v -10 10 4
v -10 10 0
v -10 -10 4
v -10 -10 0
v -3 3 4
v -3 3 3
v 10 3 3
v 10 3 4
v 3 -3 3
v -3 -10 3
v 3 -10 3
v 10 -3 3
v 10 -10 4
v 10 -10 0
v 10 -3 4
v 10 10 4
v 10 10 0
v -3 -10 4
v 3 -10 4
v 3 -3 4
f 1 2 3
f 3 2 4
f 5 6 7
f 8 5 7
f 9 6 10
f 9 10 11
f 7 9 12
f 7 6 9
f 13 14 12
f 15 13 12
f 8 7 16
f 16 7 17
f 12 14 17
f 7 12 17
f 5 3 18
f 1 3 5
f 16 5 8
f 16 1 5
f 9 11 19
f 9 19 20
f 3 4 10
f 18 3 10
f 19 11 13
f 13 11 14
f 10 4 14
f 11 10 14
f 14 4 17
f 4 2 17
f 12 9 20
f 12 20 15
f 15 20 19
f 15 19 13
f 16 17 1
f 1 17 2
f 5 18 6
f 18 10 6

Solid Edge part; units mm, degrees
sketch "Sketch1" plane through (0, 0, 0) normal (0, 0, 1) x (1, 0, 0)
  line L0 (-10, -10) -> (10, -10)
  line L1 (10, -10) -> (10, 10)
  line L2 (10, 10) -> (-10, 10)
  line L3 (-10, 10) -> (-10, -10)
extrude "Protrusion1" add sketch "Sketch1" along normal blind 3
sketch "Sketch2" plane through (0, 0, 3) normal (0, 0, 1) x (1, 0, 0)
  line L0 (-10, -10) -> (-5, -10)
  line L1 (-5, -10) -> (-5, 10)
  line L2 (-5, 10) -> (-10, 10)
  line L3 (-10, 10) -> (-10, -10)
extrude "Extrusionsausprägung_2" add sketch "Sketch2" along normal blind 1
sketch "Sketch3" plane through (2.5, 0, 3) normal (0, 0, 1) x (1, 0, 0)
  line L0 (-7.5, 10) -> (7.5, 10)
  line L1 (7.5, 10) -> (7.5, 5)
  line L2 (7.5, 5) -> (-7.5, 5)
  line L3 (-7.5, 5) -> (-7.5, 10)
extrude "Extrusionsausprägung_3" add sketch "Sketch3" along normal blind 1
sketch "Sketch4" plane through (2.5, -2.5, 3) normal (0, 0, 1) x (1, 0, 0)
  line L0 (7.5, -7.5) -> (7.5, -2.5)
  line L1 (7.5, -2.5) -> (2.5, -2.5)
  line L2 (2.5, -2.5) -> (2.5, -7.5)
  line L3 (2.5, -7.5) -> (7.5, -7.5)
extrude "Extrusionsausprägung_4" add sketch "Sketch4" along normal blind 1
sketch "Sketch5" plane through (2.5, -2.5, 3) normal (0, 0, 1) x (1, 0, 0)
  line L0 (2.5, -7.5) -> (1.5, -7.5)
  line L1 (1.5, -7.5) -> (1.5, -2.4982)
  line L2 (1.5, -1.5) -> (1.5, -2.4982)
  line L3 (7.5, -1.5) -> (1.5, -1.5)
  line L4 (7.5, -2.5) -> (7.5, -1.5)
  line L5 (7.5, -2.5) -> (2.5, -2.5)
  line L6 (2.5, -2.5) -> (2.5, -7.5)
extrude "Extrusionsausprägung_5" add sketch "Sketch5" along normal blind 1
sketch "Sketch6" plane through (2.5, -2.5, 3) normal (0, 0, 1) x (1, 0, 0)
  line L0 (-7.5, -7.5) -> (-6.5, -7.5)
  line L1 (-6.5, -7.5) -> (-6.5, 6.5)
  line L2 (-6.5, 6.5) -> (7.5, 6.5)
  line L3 (7.5, 6.5) -> (7.5, 7.5)
  line L4 (7.5, 7.5) -> (-7.5, 7.5)
  line L5 (-7.5, 7.5) -> (-7.5, -7.5)
extrude "Extrusionsausprägung_6" add sketch "Sketch6" along normal blind 1
sketch "Sketch7" plane through (3, -3, 3) normal (0, 0, 1) x (1, 0, 0)
  line L0 (-7, -7) -> (-6, -7)
  line L1 (-6, -7) -> (-6, 6)
  line L2 (-6, 6) -> (7, 6)
  line L3 (7, 6) -> (7, 7)
  line L4 (7, 7) -> (-7, 7)
  line L5 (-7, 7) -> (-7, -7)
extrude "Extrusionsausprägung_7" add sketch "Sketch7" along normal blind 1
sketch "Sketch8" plane through (3.5, -3.5, 3) normal (0, 0, 1) x (1, 0, 0)
  line L0 (0.5, -6.5) -> (-0.5, -6.5)
  line L1 (-0.5, -6.5) -> (-0.5, 0.5)
  line L2 (-0.5, 0.5) -> (6.5, 0.5)
  line L3 (6.5, 0.5) -> (6.5, -0.5)
  line L4 (6.5, -0.5) -> (0.5, -0.5)
  line L5 (0.5, -0.5) -> (0.5, -6.5)
extrude "Extrusionsausprägung_8" add sketch "Sketch8" along normal blind 1
